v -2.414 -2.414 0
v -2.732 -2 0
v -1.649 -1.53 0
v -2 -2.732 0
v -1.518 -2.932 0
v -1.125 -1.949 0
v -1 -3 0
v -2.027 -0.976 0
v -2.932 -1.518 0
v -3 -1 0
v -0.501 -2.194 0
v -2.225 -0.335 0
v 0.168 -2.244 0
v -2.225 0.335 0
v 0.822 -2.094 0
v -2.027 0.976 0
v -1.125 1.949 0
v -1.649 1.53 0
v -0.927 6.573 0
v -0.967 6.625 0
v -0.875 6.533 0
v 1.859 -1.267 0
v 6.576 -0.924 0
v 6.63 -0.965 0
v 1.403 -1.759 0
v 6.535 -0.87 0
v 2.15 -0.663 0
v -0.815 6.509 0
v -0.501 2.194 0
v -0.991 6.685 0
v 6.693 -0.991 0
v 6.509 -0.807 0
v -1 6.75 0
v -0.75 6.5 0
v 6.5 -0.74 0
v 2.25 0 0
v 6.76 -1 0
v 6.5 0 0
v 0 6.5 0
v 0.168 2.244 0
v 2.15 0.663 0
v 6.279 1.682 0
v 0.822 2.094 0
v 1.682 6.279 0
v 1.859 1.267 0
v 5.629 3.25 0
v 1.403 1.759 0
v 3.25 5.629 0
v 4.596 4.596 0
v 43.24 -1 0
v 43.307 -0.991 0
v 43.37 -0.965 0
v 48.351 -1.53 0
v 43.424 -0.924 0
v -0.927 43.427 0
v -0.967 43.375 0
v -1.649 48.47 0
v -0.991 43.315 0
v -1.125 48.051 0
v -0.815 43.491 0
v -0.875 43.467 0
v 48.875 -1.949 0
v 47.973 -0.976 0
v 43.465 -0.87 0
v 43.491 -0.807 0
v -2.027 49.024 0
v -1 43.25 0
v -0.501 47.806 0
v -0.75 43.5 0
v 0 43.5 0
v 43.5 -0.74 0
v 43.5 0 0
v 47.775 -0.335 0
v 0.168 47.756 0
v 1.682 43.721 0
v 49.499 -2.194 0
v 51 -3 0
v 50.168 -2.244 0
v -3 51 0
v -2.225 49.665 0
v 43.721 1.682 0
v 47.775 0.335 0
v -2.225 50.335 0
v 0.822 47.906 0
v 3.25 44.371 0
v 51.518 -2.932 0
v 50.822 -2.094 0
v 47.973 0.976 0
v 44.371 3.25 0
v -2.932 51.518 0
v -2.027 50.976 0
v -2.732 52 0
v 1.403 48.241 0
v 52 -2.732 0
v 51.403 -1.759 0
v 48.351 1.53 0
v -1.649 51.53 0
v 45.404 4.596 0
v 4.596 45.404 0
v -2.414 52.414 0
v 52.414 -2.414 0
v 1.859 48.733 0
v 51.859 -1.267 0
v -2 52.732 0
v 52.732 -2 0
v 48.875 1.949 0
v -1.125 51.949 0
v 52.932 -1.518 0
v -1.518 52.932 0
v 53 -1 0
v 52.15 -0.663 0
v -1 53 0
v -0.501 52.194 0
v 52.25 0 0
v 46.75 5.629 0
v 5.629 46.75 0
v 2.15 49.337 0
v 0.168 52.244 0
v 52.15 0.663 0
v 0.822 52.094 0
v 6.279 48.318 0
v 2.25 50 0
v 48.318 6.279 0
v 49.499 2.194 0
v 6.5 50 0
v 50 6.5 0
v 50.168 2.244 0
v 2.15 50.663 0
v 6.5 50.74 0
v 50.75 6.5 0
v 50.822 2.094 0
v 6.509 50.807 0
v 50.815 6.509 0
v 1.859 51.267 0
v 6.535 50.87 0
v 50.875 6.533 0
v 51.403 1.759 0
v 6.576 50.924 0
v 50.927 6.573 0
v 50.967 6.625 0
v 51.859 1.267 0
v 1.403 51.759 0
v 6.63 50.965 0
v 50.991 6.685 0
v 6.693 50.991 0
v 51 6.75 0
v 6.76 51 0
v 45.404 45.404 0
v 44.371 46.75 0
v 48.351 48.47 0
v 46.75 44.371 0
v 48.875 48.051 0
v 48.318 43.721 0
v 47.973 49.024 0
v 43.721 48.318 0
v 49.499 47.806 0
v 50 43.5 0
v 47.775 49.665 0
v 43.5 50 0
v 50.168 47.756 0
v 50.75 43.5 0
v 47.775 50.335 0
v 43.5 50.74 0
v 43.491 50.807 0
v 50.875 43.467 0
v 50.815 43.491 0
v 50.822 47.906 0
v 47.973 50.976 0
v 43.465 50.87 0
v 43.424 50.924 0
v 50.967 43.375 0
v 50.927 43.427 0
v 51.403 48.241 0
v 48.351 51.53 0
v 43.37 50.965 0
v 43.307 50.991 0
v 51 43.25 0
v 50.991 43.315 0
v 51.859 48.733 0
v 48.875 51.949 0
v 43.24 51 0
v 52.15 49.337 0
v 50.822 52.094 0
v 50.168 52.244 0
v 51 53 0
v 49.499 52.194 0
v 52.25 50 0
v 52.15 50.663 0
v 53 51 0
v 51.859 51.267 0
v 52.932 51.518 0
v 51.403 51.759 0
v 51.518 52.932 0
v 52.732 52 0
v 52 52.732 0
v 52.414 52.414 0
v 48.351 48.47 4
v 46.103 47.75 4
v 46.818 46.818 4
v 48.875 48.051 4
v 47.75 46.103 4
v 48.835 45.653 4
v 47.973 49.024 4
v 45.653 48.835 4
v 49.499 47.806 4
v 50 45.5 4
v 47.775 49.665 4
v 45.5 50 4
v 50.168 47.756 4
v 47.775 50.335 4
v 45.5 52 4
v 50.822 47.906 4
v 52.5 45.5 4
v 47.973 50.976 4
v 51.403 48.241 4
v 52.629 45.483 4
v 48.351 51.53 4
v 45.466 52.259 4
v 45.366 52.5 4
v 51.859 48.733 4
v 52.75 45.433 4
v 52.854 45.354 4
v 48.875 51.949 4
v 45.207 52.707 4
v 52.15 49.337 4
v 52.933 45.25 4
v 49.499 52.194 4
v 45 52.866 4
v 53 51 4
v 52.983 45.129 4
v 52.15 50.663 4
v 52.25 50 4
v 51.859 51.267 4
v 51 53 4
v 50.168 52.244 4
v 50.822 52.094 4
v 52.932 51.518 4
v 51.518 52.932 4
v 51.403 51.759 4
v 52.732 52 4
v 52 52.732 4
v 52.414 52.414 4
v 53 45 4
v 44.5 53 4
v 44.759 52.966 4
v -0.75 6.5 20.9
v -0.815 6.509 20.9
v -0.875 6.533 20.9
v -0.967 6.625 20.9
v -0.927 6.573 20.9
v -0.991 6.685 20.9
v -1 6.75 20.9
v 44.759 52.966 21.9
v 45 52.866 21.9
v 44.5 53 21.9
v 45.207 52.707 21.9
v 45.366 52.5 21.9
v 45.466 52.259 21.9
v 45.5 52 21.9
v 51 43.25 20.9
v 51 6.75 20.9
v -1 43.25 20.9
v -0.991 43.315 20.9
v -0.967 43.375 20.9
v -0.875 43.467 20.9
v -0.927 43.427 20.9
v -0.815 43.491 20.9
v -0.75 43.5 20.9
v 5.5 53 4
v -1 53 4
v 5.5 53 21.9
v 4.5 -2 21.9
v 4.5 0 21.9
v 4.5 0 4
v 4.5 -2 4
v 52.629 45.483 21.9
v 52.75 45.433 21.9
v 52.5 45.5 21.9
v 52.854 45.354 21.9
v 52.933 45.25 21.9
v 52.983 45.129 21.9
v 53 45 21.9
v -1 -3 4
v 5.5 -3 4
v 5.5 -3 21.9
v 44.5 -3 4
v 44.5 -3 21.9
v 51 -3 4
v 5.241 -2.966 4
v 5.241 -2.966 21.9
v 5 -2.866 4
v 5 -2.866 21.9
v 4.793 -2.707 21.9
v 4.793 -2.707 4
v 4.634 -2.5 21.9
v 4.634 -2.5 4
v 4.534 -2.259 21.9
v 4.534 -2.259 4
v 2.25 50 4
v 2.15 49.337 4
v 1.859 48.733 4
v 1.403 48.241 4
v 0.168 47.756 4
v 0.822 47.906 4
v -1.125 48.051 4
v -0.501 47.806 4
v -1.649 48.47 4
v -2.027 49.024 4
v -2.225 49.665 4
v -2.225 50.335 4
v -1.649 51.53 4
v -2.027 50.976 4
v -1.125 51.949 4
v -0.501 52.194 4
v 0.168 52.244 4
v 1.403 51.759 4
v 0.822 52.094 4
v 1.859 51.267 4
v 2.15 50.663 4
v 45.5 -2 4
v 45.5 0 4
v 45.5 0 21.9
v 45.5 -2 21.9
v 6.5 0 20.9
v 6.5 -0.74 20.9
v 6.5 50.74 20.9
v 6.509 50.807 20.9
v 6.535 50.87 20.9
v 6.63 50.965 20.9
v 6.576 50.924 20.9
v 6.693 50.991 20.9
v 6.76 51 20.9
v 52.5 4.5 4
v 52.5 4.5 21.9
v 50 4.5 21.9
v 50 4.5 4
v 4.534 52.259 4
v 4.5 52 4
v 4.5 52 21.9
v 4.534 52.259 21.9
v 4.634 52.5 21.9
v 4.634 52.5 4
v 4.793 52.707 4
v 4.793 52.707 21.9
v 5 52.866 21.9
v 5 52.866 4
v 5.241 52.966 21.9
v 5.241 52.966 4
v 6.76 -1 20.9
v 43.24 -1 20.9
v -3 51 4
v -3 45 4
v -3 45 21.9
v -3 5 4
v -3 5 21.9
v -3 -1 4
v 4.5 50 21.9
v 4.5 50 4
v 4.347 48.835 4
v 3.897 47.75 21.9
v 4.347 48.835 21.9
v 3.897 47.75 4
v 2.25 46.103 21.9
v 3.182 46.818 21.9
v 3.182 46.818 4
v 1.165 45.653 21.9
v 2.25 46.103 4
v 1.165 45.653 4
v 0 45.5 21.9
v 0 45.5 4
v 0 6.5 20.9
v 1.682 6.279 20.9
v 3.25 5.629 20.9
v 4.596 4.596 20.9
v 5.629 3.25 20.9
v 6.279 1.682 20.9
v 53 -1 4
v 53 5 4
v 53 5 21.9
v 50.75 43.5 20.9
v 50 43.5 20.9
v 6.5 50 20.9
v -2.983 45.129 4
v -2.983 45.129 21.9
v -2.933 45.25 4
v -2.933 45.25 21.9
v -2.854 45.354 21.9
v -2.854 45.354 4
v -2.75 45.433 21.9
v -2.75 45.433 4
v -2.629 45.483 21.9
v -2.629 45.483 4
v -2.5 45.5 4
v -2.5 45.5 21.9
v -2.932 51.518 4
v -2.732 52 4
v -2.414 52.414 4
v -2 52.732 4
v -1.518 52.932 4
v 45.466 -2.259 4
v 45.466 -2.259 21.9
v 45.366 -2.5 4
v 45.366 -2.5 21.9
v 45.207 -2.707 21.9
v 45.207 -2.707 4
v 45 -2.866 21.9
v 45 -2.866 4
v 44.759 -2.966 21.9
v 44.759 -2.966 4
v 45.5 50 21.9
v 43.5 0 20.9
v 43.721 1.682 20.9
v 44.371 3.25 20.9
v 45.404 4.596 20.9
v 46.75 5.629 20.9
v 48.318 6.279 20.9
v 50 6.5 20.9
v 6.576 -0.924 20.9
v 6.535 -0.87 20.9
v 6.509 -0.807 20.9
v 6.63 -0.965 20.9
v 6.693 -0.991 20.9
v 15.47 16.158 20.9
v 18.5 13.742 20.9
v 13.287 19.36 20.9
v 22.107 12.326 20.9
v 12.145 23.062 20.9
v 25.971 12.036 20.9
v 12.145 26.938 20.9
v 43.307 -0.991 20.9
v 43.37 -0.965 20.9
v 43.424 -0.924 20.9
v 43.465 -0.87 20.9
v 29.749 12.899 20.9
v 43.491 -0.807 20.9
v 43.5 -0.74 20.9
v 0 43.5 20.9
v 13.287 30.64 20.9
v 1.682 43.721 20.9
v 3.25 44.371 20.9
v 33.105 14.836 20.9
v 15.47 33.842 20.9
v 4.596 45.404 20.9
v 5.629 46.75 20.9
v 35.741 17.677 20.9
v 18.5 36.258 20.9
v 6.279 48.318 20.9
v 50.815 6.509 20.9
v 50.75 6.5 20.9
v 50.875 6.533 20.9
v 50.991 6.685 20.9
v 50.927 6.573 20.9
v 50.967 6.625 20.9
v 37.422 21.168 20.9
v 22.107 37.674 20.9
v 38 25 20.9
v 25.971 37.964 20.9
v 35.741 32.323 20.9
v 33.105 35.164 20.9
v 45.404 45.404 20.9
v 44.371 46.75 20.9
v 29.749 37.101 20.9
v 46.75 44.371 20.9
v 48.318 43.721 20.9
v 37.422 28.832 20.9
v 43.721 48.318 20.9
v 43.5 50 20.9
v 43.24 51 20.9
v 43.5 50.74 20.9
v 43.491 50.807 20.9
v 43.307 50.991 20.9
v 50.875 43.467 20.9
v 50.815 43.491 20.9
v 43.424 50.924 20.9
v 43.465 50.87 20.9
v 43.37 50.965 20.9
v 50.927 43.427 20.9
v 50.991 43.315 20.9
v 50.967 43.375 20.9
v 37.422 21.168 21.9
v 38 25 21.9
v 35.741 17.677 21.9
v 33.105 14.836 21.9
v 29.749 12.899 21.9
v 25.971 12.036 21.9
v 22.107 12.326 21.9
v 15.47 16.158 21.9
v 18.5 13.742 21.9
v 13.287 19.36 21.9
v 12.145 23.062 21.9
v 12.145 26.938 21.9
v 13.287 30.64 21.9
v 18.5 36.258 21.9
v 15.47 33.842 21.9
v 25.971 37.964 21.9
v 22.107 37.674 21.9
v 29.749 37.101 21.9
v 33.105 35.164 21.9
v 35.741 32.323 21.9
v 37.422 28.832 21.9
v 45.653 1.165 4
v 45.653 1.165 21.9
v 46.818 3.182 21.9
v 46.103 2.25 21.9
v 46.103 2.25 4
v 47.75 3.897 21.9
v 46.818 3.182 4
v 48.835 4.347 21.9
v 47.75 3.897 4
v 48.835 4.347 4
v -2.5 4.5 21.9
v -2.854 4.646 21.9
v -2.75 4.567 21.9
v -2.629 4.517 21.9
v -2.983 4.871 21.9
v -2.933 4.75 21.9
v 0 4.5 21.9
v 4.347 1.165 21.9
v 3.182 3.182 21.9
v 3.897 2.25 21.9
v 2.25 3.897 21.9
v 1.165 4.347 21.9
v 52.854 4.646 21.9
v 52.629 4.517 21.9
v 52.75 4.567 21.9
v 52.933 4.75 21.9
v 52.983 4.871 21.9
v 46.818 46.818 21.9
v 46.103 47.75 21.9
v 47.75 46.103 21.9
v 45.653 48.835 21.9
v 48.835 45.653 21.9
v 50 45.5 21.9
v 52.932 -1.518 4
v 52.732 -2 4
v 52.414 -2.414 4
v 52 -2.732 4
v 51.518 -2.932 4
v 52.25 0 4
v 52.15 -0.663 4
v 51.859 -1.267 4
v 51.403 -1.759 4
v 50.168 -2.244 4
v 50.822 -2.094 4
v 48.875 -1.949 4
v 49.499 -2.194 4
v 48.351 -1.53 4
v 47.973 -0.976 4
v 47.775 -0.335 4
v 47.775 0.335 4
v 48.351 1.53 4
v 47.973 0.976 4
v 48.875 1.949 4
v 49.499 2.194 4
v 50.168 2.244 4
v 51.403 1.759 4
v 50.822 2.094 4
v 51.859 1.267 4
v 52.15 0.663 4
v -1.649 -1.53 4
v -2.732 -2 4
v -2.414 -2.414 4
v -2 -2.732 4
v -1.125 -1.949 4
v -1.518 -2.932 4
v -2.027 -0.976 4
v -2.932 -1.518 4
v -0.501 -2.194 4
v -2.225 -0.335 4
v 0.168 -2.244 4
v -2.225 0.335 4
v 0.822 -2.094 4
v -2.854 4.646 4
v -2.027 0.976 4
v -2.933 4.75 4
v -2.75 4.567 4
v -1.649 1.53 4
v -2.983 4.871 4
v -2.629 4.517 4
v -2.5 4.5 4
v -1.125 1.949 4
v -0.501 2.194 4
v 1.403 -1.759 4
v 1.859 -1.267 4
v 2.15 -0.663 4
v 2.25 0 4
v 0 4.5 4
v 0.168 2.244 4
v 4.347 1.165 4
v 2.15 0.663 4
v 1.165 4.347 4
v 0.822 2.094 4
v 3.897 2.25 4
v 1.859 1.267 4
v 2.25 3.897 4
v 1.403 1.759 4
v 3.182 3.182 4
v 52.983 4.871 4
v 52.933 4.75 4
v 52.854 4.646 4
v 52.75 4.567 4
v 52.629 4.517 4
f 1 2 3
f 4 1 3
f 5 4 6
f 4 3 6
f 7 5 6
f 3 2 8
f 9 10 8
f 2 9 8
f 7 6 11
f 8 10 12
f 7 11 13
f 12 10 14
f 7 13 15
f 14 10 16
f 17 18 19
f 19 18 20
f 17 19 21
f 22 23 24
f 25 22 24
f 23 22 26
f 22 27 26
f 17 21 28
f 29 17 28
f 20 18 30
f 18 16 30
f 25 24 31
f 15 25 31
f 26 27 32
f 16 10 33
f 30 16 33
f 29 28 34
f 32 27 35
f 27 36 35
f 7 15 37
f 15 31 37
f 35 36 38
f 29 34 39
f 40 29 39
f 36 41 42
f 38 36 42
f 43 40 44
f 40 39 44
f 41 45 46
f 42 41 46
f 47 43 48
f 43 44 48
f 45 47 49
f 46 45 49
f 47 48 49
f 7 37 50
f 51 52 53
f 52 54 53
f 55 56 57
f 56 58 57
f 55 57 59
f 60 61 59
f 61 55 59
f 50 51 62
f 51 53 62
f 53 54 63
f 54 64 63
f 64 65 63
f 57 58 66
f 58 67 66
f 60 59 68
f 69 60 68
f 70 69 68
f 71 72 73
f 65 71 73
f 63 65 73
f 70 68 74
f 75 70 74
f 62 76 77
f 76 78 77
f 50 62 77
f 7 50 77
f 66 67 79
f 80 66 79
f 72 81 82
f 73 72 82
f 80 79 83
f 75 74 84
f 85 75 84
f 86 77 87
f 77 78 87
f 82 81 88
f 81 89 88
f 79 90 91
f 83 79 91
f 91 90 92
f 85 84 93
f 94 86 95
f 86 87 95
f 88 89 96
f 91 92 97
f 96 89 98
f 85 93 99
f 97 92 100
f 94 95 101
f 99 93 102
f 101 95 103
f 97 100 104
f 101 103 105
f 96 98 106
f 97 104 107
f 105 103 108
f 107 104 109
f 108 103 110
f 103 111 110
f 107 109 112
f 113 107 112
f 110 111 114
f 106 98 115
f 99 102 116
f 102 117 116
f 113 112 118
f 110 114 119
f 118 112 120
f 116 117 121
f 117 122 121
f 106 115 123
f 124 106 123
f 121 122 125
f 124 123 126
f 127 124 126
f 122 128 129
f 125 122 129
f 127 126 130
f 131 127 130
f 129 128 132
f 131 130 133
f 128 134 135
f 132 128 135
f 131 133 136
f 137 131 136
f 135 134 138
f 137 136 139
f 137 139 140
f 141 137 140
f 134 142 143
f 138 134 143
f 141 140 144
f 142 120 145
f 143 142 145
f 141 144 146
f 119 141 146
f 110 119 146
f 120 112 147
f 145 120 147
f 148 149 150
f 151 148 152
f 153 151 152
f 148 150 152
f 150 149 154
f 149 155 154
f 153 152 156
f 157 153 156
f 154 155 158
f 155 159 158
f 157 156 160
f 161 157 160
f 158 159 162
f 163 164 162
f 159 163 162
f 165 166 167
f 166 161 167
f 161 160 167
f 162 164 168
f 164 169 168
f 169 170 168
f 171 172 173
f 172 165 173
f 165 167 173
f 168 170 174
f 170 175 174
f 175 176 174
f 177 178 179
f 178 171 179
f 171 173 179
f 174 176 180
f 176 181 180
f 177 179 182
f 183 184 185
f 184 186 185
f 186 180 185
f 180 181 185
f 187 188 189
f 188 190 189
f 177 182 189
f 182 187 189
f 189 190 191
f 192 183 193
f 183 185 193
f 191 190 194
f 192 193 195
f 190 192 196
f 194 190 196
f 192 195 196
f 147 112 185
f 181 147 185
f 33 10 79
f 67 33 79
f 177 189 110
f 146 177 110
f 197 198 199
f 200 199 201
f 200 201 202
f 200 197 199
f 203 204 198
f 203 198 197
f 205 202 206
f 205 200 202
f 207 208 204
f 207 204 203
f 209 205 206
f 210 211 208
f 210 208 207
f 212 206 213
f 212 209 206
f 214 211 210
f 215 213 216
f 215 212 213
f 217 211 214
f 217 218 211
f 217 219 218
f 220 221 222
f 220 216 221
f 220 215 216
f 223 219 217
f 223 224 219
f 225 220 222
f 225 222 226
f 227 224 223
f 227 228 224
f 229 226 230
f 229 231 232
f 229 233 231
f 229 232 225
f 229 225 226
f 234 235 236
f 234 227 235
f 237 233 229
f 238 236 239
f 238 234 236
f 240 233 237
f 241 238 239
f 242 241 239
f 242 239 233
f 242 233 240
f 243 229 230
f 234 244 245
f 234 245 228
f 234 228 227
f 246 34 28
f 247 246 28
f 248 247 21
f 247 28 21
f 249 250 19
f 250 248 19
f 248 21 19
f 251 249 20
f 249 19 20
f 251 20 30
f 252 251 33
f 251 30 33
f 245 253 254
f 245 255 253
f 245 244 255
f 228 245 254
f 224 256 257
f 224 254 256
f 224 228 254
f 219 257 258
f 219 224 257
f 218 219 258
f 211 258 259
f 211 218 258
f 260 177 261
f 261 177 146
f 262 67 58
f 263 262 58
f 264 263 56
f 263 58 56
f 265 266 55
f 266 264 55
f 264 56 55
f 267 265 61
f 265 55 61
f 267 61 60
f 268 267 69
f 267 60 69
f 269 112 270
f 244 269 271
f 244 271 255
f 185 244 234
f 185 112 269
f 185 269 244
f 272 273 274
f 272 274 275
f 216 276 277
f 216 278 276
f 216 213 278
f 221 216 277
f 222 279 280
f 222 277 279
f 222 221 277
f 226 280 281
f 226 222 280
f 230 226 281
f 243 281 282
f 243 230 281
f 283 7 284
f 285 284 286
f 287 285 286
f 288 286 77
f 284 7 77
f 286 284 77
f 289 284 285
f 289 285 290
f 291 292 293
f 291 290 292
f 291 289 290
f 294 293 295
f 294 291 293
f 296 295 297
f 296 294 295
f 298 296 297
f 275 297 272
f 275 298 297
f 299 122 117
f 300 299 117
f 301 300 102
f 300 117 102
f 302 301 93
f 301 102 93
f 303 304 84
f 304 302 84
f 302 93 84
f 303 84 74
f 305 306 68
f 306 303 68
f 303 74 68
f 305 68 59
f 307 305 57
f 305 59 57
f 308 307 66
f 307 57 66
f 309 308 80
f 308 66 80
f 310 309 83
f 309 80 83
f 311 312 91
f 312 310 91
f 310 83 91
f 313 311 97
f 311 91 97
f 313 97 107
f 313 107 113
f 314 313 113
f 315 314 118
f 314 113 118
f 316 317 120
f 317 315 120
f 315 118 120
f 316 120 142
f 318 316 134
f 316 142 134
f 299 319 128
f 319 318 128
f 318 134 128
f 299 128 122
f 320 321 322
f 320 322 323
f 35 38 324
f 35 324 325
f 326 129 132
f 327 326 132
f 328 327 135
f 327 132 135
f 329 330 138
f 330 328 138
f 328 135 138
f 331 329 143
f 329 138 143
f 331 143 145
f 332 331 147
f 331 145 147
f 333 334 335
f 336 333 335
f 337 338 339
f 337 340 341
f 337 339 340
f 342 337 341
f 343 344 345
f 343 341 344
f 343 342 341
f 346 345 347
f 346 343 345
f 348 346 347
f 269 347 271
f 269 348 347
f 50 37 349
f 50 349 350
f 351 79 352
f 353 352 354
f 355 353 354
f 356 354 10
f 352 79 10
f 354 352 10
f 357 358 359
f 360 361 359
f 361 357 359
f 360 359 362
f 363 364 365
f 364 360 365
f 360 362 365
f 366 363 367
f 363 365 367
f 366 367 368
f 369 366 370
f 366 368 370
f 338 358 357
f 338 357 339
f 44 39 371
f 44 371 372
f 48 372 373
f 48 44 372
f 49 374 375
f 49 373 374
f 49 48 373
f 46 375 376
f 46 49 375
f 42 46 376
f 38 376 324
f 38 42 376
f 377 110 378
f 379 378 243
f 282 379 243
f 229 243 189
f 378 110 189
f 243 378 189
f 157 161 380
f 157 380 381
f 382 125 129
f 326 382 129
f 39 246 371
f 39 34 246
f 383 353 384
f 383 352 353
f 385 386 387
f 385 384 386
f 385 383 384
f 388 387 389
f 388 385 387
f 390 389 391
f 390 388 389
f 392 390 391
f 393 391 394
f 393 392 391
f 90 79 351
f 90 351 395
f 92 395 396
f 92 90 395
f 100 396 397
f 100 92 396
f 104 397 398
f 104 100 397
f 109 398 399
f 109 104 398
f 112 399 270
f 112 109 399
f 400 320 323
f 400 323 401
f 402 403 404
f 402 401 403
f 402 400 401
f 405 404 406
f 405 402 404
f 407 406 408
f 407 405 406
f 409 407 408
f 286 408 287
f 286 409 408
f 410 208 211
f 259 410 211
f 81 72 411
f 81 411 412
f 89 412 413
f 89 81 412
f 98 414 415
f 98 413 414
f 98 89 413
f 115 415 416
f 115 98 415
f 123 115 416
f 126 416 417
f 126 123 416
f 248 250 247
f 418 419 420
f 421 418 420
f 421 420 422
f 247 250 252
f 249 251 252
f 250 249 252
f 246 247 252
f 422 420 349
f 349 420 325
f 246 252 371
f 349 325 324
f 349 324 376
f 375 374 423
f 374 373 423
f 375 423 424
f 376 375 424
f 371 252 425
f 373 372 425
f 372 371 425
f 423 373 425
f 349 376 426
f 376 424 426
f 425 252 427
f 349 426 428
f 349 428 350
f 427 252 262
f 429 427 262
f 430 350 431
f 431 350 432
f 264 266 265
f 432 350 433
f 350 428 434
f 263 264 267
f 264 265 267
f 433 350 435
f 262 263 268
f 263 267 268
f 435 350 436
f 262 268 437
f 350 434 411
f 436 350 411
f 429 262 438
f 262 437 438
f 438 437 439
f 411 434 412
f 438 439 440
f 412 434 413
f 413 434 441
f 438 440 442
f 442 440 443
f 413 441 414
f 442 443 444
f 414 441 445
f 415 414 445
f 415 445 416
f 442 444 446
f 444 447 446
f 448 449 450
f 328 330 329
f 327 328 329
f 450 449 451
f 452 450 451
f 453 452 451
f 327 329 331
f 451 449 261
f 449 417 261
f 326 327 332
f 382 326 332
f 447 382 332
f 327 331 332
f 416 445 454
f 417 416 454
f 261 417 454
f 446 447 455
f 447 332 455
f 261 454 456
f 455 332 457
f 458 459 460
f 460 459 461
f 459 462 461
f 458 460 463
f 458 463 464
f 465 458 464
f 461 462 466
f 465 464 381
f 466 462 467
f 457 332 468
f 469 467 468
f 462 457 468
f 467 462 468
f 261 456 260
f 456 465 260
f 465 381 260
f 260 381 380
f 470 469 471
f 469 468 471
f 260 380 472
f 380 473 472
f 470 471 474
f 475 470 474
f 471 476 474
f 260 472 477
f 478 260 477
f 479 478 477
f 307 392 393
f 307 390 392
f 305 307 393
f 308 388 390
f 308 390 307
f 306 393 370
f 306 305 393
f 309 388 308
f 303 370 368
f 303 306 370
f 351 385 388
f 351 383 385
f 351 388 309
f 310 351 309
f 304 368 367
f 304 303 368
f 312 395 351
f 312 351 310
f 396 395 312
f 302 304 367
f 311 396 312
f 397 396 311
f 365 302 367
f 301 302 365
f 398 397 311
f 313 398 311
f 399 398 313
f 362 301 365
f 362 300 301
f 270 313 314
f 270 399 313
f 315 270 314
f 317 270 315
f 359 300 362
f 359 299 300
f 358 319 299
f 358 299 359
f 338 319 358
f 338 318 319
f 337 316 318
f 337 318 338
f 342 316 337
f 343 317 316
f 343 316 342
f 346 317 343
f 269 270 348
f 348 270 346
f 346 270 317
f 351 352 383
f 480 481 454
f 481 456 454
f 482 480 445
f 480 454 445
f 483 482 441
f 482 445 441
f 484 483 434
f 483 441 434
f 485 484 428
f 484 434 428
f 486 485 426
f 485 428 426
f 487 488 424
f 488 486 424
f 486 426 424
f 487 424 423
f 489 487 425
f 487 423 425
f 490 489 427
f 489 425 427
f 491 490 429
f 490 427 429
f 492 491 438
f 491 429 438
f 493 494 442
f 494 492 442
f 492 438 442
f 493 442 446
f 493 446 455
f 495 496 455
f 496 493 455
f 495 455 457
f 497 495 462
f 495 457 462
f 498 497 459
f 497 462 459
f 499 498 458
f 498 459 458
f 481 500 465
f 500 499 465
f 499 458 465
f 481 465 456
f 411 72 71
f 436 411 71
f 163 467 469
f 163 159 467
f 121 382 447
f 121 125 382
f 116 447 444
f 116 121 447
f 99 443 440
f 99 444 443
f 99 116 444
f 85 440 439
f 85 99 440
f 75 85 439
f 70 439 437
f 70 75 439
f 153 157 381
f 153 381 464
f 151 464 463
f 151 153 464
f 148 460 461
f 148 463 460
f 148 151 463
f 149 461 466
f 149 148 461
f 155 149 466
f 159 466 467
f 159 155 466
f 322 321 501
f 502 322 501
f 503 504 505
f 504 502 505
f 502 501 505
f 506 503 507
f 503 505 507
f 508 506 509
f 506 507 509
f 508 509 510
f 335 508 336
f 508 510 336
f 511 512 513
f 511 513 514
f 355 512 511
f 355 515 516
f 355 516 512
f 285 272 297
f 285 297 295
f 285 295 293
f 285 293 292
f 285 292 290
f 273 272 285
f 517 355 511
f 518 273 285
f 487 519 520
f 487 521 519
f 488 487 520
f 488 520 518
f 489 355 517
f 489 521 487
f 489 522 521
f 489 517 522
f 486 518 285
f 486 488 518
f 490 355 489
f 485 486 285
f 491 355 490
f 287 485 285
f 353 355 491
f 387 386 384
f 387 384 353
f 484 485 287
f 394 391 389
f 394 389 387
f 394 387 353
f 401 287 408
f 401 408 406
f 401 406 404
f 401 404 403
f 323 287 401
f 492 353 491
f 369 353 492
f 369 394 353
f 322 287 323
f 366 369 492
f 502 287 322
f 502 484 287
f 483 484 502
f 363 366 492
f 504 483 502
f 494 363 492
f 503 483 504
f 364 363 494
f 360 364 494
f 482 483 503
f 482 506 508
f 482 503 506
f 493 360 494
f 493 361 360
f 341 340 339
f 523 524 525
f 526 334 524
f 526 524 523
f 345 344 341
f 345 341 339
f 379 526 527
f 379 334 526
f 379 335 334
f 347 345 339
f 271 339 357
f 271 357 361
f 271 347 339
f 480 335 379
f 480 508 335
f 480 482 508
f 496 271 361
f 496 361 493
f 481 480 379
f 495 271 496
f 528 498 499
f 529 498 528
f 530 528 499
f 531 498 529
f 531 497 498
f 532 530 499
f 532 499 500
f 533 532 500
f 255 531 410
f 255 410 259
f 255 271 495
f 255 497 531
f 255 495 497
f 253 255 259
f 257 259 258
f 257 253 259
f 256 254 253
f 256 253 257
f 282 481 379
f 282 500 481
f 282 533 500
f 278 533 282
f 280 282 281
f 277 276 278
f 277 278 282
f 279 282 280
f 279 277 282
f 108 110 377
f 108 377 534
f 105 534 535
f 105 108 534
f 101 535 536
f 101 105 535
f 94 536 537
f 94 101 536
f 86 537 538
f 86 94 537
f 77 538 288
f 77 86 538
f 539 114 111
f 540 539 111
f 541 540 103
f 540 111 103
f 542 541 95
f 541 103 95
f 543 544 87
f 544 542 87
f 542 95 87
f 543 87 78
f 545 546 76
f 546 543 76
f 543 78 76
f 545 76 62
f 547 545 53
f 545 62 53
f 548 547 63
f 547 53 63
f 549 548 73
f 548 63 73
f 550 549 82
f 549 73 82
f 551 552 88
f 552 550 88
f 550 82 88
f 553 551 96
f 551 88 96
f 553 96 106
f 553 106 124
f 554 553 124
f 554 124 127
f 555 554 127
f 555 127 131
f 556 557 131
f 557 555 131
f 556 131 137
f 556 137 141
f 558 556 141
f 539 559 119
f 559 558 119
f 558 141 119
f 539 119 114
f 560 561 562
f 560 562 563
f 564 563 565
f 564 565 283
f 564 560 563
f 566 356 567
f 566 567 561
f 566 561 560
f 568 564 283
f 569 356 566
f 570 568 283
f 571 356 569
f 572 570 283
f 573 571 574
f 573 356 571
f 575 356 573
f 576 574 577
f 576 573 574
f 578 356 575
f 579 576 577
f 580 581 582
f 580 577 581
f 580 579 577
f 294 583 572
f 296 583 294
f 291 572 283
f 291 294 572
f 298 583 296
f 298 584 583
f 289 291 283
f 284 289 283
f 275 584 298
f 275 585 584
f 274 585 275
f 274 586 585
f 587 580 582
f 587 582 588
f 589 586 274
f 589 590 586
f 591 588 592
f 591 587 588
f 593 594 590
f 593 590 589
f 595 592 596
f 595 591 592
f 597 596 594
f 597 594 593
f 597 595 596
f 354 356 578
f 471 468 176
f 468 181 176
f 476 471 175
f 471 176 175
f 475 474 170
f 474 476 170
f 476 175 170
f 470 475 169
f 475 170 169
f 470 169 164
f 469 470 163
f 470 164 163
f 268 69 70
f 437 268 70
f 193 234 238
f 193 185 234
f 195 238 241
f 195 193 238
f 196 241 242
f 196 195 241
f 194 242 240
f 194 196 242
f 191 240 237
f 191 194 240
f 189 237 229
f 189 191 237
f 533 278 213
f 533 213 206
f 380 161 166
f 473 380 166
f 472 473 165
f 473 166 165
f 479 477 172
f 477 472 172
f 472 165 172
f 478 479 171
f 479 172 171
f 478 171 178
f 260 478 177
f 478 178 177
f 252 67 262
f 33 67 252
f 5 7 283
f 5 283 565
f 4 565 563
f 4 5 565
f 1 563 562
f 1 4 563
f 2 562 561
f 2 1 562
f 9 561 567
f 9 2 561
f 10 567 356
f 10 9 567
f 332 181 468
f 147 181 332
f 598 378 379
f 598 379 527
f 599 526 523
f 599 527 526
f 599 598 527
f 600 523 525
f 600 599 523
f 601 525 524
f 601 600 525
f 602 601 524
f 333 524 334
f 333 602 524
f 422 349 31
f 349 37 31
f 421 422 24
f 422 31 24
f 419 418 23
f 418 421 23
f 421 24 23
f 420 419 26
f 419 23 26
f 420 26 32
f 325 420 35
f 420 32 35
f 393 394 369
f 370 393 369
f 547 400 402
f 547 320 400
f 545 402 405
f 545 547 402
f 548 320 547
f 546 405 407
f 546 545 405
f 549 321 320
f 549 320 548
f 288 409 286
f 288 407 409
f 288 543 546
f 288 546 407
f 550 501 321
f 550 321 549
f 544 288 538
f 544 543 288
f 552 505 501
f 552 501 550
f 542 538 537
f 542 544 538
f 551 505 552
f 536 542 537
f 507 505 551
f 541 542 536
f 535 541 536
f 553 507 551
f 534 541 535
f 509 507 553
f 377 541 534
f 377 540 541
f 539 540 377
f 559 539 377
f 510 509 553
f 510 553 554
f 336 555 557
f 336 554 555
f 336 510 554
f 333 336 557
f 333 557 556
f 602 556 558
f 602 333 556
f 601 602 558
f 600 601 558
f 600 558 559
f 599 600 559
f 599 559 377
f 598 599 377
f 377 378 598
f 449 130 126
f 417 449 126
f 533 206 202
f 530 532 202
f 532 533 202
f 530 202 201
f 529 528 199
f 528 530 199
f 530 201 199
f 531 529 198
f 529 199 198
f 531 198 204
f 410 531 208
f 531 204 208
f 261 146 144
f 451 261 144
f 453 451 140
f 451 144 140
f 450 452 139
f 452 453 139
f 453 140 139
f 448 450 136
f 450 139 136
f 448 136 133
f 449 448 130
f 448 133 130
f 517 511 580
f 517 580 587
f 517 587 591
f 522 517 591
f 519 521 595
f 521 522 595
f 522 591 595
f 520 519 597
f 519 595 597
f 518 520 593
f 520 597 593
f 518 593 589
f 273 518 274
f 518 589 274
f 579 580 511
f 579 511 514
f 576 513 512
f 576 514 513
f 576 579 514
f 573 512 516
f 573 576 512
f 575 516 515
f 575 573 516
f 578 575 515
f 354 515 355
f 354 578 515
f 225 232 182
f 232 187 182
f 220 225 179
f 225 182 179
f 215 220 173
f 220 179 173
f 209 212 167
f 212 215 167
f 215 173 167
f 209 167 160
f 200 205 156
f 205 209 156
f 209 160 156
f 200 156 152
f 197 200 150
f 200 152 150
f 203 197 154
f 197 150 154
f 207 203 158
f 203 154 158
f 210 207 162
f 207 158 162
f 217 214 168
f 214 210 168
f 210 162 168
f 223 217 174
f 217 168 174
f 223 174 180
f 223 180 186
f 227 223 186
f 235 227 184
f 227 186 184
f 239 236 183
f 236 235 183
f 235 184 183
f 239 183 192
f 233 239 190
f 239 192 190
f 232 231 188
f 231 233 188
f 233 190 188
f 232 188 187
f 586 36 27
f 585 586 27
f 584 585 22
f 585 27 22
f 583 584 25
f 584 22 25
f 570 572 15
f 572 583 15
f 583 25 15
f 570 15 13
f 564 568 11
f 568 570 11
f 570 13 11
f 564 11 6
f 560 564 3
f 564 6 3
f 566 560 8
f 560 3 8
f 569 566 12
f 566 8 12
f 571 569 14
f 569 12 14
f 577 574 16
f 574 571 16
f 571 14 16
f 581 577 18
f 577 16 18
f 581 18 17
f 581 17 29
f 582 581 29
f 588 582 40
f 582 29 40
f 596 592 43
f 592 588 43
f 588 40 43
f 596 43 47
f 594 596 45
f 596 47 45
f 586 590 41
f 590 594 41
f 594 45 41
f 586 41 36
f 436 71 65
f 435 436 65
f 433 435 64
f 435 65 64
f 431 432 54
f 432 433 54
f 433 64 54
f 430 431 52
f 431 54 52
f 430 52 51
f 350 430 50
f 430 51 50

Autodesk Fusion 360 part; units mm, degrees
sketch "Esquisse1" plane through (0, 0, 0) normal (0, 0, 1) x (1, 0, 0)
  circle A0 centre (0, 0) radius 2.25
  line L0 (5.5, -3) -> (25, -3)
  line L1 (25, -3) -> (25, 25) construction
  line L2 (25, 25) -> (-3, 25) construction
  line L3 (-3, 25) -> (-3, 5)
  arc A1 (-3, -1) -> (-1, -3) centre (-1, -1) ccw
  line L4 (-1, 4.5) -> (0, 4.5)
  line L5 (4.5, 0) -> (4.5, -1)
  line L6 (-1, 25) -> (-1, 6.75)
  line L7 (6.76, -1) -> (25, -1)
  arc A2 (4.5, 0) -> (0, 4.5) centre (0, 0) ccw
  line L8 (-0.75, 6.5) -> (0, 6.5)
  line L9 (6.5, 0) -> (6.5, -0.74)
  arc A3 (6.5, 0) -> (0, 6.5) centre (0, 0) ccw
  line L10 (-2.5, 4.5) -> (-1, 4.5)
  line L11 (4.5, -1) -> (4.5, -2)
  arc A4 (6.5, -0.74) -> (6.76, -1) centre (6.76, -0.74) ccw
  arc A5 (-1, 6.75) -> (-0.75, 6.5) centre (-0.75, 6.75) ccw
  arc A6 (4.5, -2) -> (5.5, -3) centre (5.5, -2) ccw
  line L12 (-1, -3) -> (5.5, -3)
  arc A7 (-3, 5) -> (-2.5, 4.5) centre (-2.5, 5) ccw
  line L13 (-3, -1) -> (-3, 5)
  line L14 (45.5, -1) -> (45.5, -2)
  line L15 (53, -1) -> (53, 5)
  line L16 (51, 4.5) -> (50, 4.5)
  line L17 (52.5, 4.5) -> (51, 4.5)
  line L18 (50.75, 6.5) -> (50, 6.5)
  arc A8 (44.5, -3) -> (45.5, -2) centre (44.5, -2) ccw
  arc A9 (50, 4.5) -> (45.5, 0) centre (50, 0) ccw
  line L19 (43.24, -1) -> (25, -1)
  circle A10 centre (50, 0) radius 2.25
  line L20 (51, -3) -> (44.5, -3)
  line L21 (45.5, 0) -> (45.5, -1)
  line L22 (44.5, -3) -> (25, -3)
  arc A11 (52.5, 4.5) -> (53, 5) centre (52.5, 5) ccw
  line L23 (53, 25) -> (53, 5)
  line L24 (51, 25) -> (51, 6.75)
  arc A12 (43.24, -1) -> (43.5, -0.74) centre (43.24, -0.74) ccw
  arc A13 (50.75, 6.5) -> (51, 6.75) centre (50.75, 6.75) ccw
  line L25 (43.5, 0) -> (43.5, -0.74)
  arc A14 (51, -3) -> (53, -1) centre (51, -1) ccw
  arc A15 (50, 6.5) -> (43.5, 0) centre (50, 0) ccw
  line L26 (6.76, 51) -> (25, 51)
  arc A16 (-1, 53) -> (-3, 51) centre (-1, 51) ccw
  line L27 (53, 25) -> (53, 45)
  arc A17 (51, 43.25) -> (50.75, 43.5) centre (50.75, 43.25) ccw
  line L28 (52.5, 45.5) -> (51, 45.5)
  line L29 (45.5, 50) -> (45.5, 51)
  arc A18 (5.5, 53) -> (4.5, 52) centre (5.5, 52) ccw
  line L30 (-1, 53) -> (5.5, 53)
  line L31 (43.24, 51) -> (25, 51)
  arc A19 (53, 51) -> (51, 53) centre (51, 51) ccw
  line L32 (50.75, 43.5) -> (50, 43.5)
  line L33 (5.5, 53) -> (25, 53)
  line L34 (44.5, 53) -> (25, 53)
  line L35 (51, 45.5) -> (50, 45.5)
  arc A20 (-0.75, 43.5) -> (-1, 43.25) centre (-0.75, 43.25) ccw
  arc A21 (0, 45.5) -> (4.5, 50) centre (0, 50) ccw
  line L36 (4.5, 50) -> (4.5, 51)
  line L37 (-1, 25) -> (-1, 43.25)
  line L38 (4.5, 51) -> (4.5, 52)
  line L39 (6.5, 50) -> (6.5, 50.74)
  line L40 (51, 25) -> (51, 43.25)
  line L41 (-1, 45.5) -> (0, 45.5)
  line L42 (51, 53) -> (44.5, 53)
  line L43 (45.5, 51) -> (45.5, 52)
  arc A22 (43.5, 50.74) -> (43.24, 51) centre (43.24, 50.74) ccw
  arc A23 (53, 45) -> (52.5, 45.5) centre (52.5, 45) ccw
  arc A24 (0, 43.5) -> (6.5, 50) centre (0, 50) ccw
  line L44 (53, 51) -> (53, 45)
  arc A25 (6.76, 51) -> (6.5, 50.74) centre (6.76, 50.74) ccw
  line L45 (-3, 25) -> (-3, 45)
  arc A26 (45.5, 52) -> (44.5, 53) centre (44.5, 52) ccw
  arc A27 (43.5, 50) -> (50, 43.5) centre (50, 50) ccw
  circle A28 centre (0, 50) radius 2.25
  line L46 (43.5, 50) -> (43.5, 50.74)
  circle A29 centre (50, 50) radius 2.25
  line L47 (-0.75, 43.5) -> (0, 43.5)
  line L48 (-3, 51) -> (-3, 45)
  arc A30 (45.5, 50) -> (50, 45.5) centre (50, 50) ccw
  arc A31 (-2.5, 45.5) -> (-3, 45) centre (-2.5, 45) ccw
  line L49 (-2.5, 45.5) -> (-1, 45.5)
  circle A32 centre (25, 25) radius 13
  point P0 (50, 0)
  point P1 (25, 25)
  point P2 (25, 25)
  point P3 (25, 25)
  point P4 (0, 50)
  point P5 (50, 50)
  dimension "d22" = 4.5
  dimension "d23" = 3
  dimension "d24" = 3
  dimension "d25" = 2
  dimension "d30" = 25
  dimension "d31" = 25
  dimension "d32" = 2
  dimension "d33" = 2
  dimension "d34" = 4.5
  dimension "d35" = 4.5
  dimension "d36" = 4.5
  dimension "d37" = 2
  dimension "d38" = 2
  dimension "d39" = 6.5
  dimension "d40" = 0.26
  dimension "d41" = 0.25
  dimension "d42" = 1
  dimension "d43" = 0.5
  dimension "d44" = 26
extrude "Extrusion1" add sketch "Esquisse1" along normal blind 4 contours L0 L3 L4 L5 A2 L10 L11 A6 A7 L14 L16 L17 A8 A9 L21 L22 A11 L23 L27 L28 L29 A18 L33 L34 L35 A21 L36 L38 L41 L43 A23 L45 A26 A30 A31 L49 | A1 L4 L5 A2 L10 L11 A6 L12 A7 L13 | L14 L15 L16 L17 A8 A9 L20 L21 A11 A14 | A16 A18 L30 A21 L36 L38 L41 L48 A31 L49 | L28 L29 A19 L35 L42 L43 A23 L44 A26 A30
extrude "Extrusion2" add sketch "Esquisse1" along normal blind 16.9 from surface at 4 contours L0 L3 L4 L5 A2 L10 L11 A6 A7 L14 L16 L17 A8 A9 L21 L22 A11 L23 L27 L28 L29 A18 L33 L34 L35 A21 L36 L38 L41 L43 A23 L45 A26 A30 A31 L49
extrude "Extrusion3" add sketch "Esquisse1" along normal blind 1 from surface at 20.9 contours L0 L3 L4 L5 A2 L10 L11 A6 A7 L14 L16 L17 A8 A9 L21 L22 A11 L23 L27 L28 L29 A18 L33 L34 L35 A21 L36 L38 L41 L43 A23 L45 A26 A30 A31 L49 | L6 L7 L8 L9 A3 A4 A5 L18 L19 L24 A12 A13 L25 A15 L26 A17 L31 L32 A20 L37 L39 L40 A22 A24 A25 A27 L46 L47
equation "d48 = 8.9 mm + 8 mm"
equation "d50 = 12.9 mm + 8 mm"
